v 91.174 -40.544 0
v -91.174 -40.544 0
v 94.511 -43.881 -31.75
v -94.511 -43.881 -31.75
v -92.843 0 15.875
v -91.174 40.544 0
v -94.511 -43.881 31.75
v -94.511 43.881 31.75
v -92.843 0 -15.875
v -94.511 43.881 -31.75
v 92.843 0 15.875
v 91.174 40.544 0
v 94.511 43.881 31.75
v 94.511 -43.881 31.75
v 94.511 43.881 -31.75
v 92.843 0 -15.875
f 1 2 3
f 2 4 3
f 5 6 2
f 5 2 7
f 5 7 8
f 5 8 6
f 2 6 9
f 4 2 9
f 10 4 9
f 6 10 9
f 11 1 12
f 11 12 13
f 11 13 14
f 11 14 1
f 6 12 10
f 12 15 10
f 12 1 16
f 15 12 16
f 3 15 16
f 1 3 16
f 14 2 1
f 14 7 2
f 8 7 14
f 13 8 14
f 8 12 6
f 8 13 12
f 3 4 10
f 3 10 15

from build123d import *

# Parameters (mm, degrees)
F0_W     = 182.3483705521
F0_H     = 81.0872465372
F1_DEPTH = 31.75
F1_TAPER = -6


with BuildPart() as f1:
    # F0 (on Top) → F1 (new body, symmetric)
    with BuildSketch(Plane.XY):
        Rectangle(F0_W, F0_H)
    extrude(amount=F1_DEPTH, both=True, taper=F1_TAPER)


solid = f1.part
